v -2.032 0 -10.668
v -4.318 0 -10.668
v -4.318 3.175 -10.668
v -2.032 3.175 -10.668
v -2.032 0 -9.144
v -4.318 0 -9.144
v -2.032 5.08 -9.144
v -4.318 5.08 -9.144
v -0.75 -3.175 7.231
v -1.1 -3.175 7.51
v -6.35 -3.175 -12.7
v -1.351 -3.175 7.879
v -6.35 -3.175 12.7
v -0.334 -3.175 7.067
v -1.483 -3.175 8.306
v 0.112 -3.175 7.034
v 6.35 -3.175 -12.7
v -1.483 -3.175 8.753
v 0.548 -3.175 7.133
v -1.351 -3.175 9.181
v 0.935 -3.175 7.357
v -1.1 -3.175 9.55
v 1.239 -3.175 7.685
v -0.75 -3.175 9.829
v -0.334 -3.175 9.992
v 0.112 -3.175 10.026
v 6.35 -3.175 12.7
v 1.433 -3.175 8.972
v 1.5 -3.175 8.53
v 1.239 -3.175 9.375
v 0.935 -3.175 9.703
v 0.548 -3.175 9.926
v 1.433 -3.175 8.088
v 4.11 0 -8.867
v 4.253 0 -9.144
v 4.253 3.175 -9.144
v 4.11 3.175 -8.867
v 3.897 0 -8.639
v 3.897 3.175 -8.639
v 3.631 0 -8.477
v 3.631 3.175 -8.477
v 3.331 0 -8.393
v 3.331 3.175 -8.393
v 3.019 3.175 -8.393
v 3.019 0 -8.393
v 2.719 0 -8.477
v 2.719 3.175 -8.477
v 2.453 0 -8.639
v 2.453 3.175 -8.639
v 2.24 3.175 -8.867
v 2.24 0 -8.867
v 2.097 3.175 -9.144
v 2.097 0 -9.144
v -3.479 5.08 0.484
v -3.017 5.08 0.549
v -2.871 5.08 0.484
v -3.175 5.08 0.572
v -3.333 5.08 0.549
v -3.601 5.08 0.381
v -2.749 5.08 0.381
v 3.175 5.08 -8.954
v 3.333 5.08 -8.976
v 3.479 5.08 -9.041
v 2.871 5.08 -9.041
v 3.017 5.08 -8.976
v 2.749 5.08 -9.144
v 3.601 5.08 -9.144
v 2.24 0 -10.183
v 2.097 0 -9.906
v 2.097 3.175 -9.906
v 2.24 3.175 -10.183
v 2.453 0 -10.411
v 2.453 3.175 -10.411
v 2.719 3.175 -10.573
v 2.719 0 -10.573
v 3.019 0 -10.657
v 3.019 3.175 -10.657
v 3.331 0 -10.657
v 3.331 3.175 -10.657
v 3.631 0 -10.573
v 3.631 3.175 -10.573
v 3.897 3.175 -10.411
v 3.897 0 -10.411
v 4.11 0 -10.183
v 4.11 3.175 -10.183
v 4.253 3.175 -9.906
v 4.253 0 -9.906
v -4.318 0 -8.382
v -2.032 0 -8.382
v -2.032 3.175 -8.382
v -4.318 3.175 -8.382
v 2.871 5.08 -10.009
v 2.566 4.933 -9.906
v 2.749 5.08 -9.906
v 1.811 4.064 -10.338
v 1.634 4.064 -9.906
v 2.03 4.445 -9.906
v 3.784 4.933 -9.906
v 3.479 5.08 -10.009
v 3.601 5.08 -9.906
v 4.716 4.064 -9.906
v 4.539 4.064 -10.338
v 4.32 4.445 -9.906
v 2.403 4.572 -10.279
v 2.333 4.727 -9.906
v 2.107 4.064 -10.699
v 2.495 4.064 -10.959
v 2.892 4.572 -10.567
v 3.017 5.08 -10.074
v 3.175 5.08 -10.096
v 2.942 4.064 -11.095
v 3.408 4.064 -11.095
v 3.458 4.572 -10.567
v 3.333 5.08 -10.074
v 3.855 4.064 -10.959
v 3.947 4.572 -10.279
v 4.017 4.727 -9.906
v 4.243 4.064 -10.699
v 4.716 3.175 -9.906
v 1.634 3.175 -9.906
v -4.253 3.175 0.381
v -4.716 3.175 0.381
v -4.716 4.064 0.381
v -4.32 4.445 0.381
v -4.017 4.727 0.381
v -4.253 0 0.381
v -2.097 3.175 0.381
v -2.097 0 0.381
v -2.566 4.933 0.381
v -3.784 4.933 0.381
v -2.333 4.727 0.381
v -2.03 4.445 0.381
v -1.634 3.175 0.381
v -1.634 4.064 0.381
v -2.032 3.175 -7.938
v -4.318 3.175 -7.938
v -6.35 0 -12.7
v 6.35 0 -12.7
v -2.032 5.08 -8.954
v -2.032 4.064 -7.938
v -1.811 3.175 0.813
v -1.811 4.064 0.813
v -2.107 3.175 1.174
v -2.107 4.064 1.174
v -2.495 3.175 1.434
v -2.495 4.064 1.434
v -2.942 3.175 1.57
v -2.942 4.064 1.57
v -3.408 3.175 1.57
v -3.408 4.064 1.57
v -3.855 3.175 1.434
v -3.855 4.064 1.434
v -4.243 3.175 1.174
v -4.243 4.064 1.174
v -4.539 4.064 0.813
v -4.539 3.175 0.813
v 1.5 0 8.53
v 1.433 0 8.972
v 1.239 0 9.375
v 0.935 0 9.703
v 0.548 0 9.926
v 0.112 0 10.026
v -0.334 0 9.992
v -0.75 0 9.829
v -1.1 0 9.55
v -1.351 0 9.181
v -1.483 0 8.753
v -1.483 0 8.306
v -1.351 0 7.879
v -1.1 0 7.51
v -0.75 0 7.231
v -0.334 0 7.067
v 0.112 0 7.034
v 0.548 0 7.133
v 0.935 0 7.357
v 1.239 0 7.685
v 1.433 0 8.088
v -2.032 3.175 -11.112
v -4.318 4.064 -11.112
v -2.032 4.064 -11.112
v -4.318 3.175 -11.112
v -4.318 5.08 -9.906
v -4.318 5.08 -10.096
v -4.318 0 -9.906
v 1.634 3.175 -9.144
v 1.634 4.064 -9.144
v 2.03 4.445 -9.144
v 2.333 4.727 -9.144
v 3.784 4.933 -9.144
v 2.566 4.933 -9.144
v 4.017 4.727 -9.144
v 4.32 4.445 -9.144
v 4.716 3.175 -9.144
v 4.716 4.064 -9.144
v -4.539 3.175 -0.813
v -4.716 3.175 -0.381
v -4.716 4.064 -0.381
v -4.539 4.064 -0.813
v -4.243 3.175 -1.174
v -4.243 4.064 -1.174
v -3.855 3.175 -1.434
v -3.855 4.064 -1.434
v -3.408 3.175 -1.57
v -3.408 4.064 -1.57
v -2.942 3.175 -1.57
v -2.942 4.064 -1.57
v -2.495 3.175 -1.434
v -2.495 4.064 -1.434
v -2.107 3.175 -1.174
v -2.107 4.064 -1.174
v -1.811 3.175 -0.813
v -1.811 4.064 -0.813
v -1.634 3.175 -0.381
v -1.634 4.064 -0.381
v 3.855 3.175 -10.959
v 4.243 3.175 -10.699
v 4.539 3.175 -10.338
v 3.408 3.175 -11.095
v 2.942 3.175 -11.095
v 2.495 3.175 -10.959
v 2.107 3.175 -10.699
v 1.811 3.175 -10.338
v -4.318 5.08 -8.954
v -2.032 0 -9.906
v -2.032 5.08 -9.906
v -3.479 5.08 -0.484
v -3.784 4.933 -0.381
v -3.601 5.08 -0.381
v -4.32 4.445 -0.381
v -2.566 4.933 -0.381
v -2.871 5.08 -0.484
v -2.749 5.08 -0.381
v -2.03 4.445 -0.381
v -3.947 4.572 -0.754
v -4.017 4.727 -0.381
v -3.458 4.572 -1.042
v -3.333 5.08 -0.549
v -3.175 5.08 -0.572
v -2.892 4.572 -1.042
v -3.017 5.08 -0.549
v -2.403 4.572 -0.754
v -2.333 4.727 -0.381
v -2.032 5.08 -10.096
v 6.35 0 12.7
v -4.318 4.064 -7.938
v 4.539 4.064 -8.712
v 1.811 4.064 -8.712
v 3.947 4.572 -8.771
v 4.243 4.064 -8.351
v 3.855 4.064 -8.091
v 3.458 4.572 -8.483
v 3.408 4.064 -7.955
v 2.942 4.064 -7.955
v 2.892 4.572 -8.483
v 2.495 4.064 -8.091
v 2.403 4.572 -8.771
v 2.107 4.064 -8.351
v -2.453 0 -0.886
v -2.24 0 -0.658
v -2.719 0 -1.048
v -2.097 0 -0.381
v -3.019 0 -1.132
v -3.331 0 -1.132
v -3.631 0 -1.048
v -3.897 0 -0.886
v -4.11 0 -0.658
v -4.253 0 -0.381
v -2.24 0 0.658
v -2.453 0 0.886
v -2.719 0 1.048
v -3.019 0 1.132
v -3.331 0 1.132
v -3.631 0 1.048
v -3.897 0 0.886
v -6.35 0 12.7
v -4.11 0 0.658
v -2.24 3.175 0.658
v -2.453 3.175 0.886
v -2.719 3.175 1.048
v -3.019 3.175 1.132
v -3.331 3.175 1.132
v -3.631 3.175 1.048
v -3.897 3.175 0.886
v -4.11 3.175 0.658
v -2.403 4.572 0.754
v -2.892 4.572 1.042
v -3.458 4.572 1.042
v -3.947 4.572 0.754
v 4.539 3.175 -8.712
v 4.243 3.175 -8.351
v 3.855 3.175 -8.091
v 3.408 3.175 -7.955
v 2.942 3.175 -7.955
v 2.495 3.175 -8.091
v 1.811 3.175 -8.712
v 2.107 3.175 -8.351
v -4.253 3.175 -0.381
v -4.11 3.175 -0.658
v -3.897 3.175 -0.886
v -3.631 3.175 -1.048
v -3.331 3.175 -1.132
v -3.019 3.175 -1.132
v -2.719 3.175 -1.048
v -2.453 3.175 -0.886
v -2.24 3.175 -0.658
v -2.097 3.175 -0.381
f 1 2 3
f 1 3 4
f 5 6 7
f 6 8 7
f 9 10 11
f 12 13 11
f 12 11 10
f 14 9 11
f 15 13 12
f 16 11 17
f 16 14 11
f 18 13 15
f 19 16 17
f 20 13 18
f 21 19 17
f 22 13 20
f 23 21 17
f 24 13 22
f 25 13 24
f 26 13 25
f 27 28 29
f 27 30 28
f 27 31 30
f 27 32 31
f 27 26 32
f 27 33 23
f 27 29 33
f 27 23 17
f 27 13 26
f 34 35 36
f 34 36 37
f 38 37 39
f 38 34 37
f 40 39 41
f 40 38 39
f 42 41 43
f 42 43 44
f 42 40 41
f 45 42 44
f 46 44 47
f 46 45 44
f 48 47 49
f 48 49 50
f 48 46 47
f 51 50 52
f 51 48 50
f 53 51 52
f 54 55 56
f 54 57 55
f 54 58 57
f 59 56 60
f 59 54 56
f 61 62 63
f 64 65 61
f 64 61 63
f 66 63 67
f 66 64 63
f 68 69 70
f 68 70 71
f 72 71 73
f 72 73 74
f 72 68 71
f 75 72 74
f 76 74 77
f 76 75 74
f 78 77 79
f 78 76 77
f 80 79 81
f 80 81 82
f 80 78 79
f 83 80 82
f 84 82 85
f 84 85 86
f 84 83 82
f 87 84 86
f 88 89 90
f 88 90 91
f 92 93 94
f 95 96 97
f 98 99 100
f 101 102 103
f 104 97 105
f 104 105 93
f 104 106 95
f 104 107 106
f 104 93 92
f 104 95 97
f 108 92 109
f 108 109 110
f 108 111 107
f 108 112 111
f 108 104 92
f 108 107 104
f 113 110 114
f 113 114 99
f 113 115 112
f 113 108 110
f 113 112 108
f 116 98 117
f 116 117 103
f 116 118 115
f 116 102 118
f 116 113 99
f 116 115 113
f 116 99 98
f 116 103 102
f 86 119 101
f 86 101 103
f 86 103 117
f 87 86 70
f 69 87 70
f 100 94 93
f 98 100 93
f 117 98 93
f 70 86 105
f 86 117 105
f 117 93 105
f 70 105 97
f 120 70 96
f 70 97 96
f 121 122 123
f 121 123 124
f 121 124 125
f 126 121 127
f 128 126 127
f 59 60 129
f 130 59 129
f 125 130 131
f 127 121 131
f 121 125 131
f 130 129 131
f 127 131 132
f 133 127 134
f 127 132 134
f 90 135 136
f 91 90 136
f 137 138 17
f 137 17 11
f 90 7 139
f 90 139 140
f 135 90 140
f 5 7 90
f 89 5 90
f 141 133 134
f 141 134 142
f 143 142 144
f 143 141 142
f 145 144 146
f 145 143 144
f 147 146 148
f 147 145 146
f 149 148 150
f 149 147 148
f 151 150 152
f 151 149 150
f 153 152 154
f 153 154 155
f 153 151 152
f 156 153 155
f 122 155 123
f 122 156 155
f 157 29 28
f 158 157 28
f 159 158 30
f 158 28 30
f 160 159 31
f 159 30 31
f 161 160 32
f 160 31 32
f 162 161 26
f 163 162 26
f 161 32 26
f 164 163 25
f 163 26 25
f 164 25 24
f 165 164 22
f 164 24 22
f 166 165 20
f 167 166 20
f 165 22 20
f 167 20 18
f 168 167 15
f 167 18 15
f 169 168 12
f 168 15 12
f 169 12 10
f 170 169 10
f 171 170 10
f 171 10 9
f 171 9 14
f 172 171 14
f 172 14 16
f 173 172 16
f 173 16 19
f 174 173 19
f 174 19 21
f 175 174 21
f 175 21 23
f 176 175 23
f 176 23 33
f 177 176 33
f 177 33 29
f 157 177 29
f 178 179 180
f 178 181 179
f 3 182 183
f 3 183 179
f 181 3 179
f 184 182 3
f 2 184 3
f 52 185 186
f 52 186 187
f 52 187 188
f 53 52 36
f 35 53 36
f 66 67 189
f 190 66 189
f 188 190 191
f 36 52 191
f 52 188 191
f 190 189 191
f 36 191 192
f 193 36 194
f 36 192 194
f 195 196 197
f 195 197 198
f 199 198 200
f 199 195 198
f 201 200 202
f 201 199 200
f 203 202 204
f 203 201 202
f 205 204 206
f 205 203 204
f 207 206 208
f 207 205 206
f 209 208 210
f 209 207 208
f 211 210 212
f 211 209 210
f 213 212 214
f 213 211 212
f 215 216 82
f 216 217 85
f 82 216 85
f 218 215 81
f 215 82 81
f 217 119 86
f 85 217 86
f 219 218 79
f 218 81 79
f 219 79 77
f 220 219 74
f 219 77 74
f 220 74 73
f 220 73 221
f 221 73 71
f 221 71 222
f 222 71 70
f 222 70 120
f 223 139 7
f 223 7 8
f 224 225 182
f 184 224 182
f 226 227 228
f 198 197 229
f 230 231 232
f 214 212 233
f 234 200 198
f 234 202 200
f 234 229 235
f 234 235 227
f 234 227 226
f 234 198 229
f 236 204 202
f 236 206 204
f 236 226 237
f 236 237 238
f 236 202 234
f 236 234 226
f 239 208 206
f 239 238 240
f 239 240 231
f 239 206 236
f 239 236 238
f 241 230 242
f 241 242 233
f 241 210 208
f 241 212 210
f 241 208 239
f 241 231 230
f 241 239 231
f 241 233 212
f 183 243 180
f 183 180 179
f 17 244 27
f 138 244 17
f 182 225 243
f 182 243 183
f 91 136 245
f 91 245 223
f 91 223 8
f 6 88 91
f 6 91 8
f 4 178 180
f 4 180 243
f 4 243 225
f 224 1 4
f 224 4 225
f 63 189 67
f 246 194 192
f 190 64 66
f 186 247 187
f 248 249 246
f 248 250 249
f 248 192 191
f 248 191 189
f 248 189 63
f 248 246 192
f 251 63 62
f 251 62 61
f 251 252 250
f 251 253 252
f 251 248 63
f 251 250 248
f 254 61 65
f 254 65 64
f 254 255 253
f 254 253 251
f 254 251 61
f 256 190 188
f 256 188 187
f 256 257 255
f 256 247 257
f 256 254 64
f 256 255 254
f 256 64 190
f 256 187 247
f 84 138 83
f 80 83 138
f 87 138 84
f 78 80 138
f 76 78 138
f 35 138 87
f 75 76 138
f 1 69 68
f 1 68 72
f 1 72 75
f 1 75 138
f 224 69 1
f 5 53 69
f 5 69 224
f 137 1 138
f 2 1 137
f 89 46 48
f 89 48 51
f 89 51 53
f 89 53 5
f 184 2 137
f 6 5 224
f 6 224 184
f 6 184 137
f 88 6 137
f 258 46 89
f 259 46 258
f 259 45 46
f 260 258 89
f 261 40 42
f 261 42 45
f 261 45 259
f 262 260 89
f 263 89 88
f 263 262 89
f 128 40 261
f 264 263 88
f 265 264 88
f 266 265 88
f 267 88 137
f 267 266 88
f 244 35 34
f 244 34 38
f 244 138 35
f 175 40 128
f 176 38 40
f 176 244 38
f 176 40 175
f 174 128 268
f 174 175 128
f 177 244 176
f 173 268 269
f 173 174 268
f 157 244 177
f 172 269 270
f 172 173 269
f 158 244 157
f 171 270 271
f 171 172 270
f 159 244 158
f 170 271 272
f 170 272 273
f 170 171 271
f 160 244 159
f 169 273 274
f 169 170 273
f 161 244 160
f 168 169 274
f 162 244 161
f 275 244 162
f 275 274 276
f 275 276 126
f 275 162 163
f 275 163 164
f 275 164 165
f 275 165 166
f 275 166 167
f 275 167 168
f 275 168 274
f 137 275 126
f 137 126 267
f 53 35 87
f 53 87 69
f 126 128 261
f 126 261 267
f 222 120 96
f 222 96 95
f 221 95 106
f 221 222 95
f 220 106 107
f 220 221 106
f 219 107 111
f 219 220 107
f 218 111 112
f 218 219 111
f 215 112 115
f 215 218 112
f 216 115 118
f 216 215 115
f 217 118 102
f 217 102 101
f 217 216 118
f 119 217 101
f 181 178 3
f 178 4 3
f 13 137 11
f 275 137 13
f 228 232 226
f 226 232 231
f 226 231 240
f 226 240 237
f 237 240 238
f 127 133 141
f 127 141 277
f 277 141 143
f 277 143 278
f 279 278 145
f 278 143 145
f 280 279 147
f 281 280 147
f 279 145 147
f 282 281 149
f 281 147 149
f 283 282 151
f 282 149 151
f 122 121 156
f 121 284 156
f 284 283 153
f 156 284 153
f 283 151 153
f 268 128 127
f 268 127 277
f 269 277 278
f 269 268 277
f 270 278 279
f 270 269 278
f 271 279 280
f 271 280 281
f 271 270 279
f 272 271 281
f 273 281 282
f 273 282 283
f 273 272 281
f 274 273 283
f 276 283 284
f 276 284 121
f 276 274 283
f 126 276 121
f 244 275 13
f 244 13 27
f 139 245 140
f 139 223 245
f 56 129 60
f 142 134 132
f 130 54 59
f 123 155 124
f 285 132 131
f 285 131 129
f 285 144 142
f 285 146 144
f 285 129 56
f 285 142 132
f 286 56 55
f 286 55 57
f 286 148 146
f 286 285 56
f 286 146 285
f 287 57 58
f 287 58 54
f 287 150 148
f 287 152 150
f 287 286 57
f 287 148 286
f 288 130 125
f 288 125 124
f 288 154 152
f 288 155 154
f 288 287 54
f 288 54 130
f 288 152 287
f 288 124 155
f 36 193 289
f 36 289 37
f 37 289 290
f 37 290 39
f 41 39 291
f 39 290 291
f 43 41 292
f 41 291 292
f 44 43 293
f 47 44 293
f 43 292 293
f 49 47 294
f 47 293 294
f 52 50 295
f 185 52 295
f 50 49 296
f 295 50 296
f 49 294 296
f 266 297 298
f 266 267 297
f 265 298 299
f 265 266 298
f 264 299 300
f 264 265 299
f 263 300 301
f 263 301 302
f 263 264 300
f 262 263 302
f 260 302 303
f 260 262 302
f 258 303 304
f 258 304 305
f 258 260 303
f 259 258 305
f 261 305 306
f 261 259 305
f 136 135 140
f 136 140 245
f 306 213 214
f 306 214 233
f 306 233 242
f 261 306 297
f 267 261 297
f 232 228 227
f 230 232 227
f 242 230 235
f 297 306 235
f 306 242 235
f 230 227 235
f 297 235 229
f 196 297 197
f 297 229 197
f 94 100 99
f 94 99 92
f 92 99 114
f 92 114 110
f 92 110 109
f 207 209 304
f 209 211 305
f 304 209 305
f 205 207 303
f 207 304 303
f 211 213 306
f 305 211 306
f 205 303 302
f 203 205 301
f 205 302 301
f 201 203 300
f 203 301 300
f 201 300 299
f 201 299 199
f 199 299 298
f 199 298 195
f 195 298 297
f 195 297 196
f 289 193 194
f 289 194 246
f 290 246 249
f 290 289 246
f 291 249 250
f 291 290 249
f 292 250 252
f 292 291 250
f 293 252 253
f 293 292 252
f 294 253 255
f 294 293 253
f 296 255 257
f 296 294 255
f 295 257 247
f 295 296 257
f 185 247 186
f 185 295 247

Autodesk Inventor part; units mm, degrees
ref_plane "YZ Plane" through (0, 0, 0) normal (1, 0, 0) x (0, 1, 0)
ref_plane "XZ Plane" through (0, 0, 0) normal (0, 1, 0) x (-1, 0, 0)
ref_plane "XY Plane" through (0, 0, 0) normal (0, 0, 1) x (1, 0, 0)
sketch "Sketch1" plane through (0, 0, 0) normal (0, 1, 0) x (-1, 0, 0)
  line L0 (-6.35, 12.7) -> (-6.35, -12.7)
  line L1 (-6.35, -12.7) -> (6.35, -12.7)
  line L2 (6.35, -12.7) -> (6.35, 12.7)
  line L3 (6.35, 12.7) -> (-6.35, 12.7)
  line L4 (-6.35, 12.7) -> (6.35, -12.7) construction
  line L5 (-6.35, -12.7) -> (6.35, 12.7) construction
  line L6 (-6.35, 12.7) -> (19.05, 12.7) construction
  point P0 (0, 0)
  dimension "d0" = 25.4
  dimension "d1" = 90
  dimension "d2" = 12.7
extrude "Baseplate" add sketch "Sketch1" against normal blind 3.175
sketch "Sketch2" plane through (0, -3.175, 0) normal (0, -1, 0) x (1, 0, 0)
  circle A0 centre (3.175, -9.525) radius 1.143
  circle A1 centre (-3.175, 0) radius 1.143
  circle A2 centre (0, 8.5298) radius 1.5
  line L0 (-4.318, -8.382) -> (-2.032, -8.382)
  line L1 (-2.032, -8.382) -> (-2.032, -10.668)
  line L2 (-2.032, -10.668) -> (-4.318, -10.668)
  line L3 (-4.318, -10.668) -> (-4.318, -8.382)
  line L4 (-4.318, -8.382) -> (-2.032, -10.668) construction
  line L5 (-2.032, -8.382) -> (-4.318, -10.668) construction
  point P0 (0, 0)
  point P1 (-3.175, -9.525)
  dimension "d5" = 2.286
  dimension "d6" = 2.286
  dimension "d7" = 3
  dimension "d8" = 2.286
extrude "BoltHole" cut sketch "Sketch2" against normal blind 3.175 contours A2
extrude "Extrusion3" add sketch "Sketch2" along normal blind 3.175 contours A0 | A1 | L0 L1 L2 L3
sketch "Sketch3" plane through (0, -6.35, 0) normal (0, -1, 0) x (1, 0, 0)
  line L0 (-2.032, -11.1125) -> (-4.318, -11.1125)
  line L1 (-4.318, -11.1125) -> (-4.318, -7.9375)
  line L2 (-4.318, -7.9375) -> (-2.032, -7.9375)
  line L3 (-2.032, -7.9375) -> (-2.032, -11.1125)
  line L4 (-2.032, -11.1125) -> (-4.318, -7.9375) construction
  line L5 (-4.318, -11.1125) -> (-2.032, -7.9375) construction
  circle A0 centre (-3.175, 0) radius 1.143 projected
  circle A1 centre (-3.175, 0) radius 1.5875
  circle A2 centre (3.175, -9.525) radius 1.5875
  point P0 (0, 0)
  point P1 (-3.175, -9.525)
  dimension "d13" = 2.286
  dimension "d14" = 3.175
  dimension "d15" = 3.175
  dimension "d16" = 3.175
extrude "Extrusion4" add sketch "Sketch3" along normal blind 1.905 contours L0 L1 L2 L3 | A0 | A1 | A2
chamfer "Chamfer1" distance 1.016 angle 45 4 edges at (-4.7625, -8.255, 0) (1.5875, -8.255, -9.525) (-3.175, -8.255, -7.9375) (-3.175, -8.255, -11.1125)
sketch "Sketch4" plane through (0, -8.255, 0) normal (0, -1, 0) x (1, 0, 0)
  line L0 (5.202, -9.144) -> (1.148, -9.144)
  line L1 (1.148, -9.144) -> (1.148, -9.906)
  line L2 (1.148, -9.906) -> (5.202, -9.906)
  line L3 (5.202, -9.906) -> (5.202, -9.144)
  circle A0 centre (3.175, -9.525) radius 0.5715 projected
  line L4 (5.202, -9.144) -> (1.148, -9.906) construction
  line L5 (1.148, -9.144) -> (5.202, -9.906) construction
  line L6 (-0.7593, 0.381) -> (-5.5907, 0.381)
  line L7 (-5.5907, 0.381) -> (-5.5907, -0.381)
  line L8 (-5.5907, -0.381) -> (-0.7593, -0.381)
  line L9 (-0.7593, -0.381) -> (-0.7593, 0.381)
  line L10 (-0.7593, 0.381) -> (-5.5907, -0.381) construction
  line L11 (-5.5907, 0.381) -> (-0.7593, -0.381) construction
  line L12 (-5.5907, -9.906) -> (-0.7593, -9.906)
  line L13 (-0.7593, -9.906) -> (-0.7593, -9.144)
  line L14 (-0.7593, -9.144) -> (-5.5907, -9.144)
  line L15 (-5.5907, -9.144) -> (-5.5907, -9.906)
  line L16 (-5.5907, -9.906) -> (-0.7593, -9.144) construction
  line L17 (-0.7593, -9.906) -> (-5.5907, -9.144) construction
  point P0 (0, 0)
  point P1 (-3.175, 0)
  point P2 (-3.175, -9.525)
  dimension "d24" = 0.762
  dimension "d25" = 0.762
extrude "Extrusion5" cut sketch "Sketch4" against normal blind 5.08 contours L3 L2 A0 L0 | A0 L2 L0 | A0 L2 L1 L0 | L9 L8 L7 L6 | L15 L14 L13 L12
ref_plane "Work Plane1" through (0, -1.5875, 0) normal (0, 1, 0) x (1, 0, 0)
mirror "Mirror1" about plane through (0, -1.5875, 0) normal (0, 1, 0) of "Extrusion3", "Extrusion4", "Chamfer1", "Extrusion5"
sketch "Sketch5" plane through (0, -3.175, 0) normal (0, -1, 0) x (1, 0, 0)
  line L0 (-6.35, 12.7) -> (-6.35, -12.7) projected
  line L1 (6.35, 12.7) -> (6.35, -12.7) projected
  line L2 (-6.35, -12.7) -> (6.35, -12.7)
  line L3 (6.35, -12.7) -> (6.35, 12.7)
  line L4 (6.35, 12.7) -> (-6.35, 12.7)
  line L5 (-6.35, 12.7) -> (-6.35, -12.7)
  point P0 (0, 0)
extrude "Extrusion6" cut sketch "Sketch5" along normal blind 6.0325
properties part number "MirrorBaseplate"
